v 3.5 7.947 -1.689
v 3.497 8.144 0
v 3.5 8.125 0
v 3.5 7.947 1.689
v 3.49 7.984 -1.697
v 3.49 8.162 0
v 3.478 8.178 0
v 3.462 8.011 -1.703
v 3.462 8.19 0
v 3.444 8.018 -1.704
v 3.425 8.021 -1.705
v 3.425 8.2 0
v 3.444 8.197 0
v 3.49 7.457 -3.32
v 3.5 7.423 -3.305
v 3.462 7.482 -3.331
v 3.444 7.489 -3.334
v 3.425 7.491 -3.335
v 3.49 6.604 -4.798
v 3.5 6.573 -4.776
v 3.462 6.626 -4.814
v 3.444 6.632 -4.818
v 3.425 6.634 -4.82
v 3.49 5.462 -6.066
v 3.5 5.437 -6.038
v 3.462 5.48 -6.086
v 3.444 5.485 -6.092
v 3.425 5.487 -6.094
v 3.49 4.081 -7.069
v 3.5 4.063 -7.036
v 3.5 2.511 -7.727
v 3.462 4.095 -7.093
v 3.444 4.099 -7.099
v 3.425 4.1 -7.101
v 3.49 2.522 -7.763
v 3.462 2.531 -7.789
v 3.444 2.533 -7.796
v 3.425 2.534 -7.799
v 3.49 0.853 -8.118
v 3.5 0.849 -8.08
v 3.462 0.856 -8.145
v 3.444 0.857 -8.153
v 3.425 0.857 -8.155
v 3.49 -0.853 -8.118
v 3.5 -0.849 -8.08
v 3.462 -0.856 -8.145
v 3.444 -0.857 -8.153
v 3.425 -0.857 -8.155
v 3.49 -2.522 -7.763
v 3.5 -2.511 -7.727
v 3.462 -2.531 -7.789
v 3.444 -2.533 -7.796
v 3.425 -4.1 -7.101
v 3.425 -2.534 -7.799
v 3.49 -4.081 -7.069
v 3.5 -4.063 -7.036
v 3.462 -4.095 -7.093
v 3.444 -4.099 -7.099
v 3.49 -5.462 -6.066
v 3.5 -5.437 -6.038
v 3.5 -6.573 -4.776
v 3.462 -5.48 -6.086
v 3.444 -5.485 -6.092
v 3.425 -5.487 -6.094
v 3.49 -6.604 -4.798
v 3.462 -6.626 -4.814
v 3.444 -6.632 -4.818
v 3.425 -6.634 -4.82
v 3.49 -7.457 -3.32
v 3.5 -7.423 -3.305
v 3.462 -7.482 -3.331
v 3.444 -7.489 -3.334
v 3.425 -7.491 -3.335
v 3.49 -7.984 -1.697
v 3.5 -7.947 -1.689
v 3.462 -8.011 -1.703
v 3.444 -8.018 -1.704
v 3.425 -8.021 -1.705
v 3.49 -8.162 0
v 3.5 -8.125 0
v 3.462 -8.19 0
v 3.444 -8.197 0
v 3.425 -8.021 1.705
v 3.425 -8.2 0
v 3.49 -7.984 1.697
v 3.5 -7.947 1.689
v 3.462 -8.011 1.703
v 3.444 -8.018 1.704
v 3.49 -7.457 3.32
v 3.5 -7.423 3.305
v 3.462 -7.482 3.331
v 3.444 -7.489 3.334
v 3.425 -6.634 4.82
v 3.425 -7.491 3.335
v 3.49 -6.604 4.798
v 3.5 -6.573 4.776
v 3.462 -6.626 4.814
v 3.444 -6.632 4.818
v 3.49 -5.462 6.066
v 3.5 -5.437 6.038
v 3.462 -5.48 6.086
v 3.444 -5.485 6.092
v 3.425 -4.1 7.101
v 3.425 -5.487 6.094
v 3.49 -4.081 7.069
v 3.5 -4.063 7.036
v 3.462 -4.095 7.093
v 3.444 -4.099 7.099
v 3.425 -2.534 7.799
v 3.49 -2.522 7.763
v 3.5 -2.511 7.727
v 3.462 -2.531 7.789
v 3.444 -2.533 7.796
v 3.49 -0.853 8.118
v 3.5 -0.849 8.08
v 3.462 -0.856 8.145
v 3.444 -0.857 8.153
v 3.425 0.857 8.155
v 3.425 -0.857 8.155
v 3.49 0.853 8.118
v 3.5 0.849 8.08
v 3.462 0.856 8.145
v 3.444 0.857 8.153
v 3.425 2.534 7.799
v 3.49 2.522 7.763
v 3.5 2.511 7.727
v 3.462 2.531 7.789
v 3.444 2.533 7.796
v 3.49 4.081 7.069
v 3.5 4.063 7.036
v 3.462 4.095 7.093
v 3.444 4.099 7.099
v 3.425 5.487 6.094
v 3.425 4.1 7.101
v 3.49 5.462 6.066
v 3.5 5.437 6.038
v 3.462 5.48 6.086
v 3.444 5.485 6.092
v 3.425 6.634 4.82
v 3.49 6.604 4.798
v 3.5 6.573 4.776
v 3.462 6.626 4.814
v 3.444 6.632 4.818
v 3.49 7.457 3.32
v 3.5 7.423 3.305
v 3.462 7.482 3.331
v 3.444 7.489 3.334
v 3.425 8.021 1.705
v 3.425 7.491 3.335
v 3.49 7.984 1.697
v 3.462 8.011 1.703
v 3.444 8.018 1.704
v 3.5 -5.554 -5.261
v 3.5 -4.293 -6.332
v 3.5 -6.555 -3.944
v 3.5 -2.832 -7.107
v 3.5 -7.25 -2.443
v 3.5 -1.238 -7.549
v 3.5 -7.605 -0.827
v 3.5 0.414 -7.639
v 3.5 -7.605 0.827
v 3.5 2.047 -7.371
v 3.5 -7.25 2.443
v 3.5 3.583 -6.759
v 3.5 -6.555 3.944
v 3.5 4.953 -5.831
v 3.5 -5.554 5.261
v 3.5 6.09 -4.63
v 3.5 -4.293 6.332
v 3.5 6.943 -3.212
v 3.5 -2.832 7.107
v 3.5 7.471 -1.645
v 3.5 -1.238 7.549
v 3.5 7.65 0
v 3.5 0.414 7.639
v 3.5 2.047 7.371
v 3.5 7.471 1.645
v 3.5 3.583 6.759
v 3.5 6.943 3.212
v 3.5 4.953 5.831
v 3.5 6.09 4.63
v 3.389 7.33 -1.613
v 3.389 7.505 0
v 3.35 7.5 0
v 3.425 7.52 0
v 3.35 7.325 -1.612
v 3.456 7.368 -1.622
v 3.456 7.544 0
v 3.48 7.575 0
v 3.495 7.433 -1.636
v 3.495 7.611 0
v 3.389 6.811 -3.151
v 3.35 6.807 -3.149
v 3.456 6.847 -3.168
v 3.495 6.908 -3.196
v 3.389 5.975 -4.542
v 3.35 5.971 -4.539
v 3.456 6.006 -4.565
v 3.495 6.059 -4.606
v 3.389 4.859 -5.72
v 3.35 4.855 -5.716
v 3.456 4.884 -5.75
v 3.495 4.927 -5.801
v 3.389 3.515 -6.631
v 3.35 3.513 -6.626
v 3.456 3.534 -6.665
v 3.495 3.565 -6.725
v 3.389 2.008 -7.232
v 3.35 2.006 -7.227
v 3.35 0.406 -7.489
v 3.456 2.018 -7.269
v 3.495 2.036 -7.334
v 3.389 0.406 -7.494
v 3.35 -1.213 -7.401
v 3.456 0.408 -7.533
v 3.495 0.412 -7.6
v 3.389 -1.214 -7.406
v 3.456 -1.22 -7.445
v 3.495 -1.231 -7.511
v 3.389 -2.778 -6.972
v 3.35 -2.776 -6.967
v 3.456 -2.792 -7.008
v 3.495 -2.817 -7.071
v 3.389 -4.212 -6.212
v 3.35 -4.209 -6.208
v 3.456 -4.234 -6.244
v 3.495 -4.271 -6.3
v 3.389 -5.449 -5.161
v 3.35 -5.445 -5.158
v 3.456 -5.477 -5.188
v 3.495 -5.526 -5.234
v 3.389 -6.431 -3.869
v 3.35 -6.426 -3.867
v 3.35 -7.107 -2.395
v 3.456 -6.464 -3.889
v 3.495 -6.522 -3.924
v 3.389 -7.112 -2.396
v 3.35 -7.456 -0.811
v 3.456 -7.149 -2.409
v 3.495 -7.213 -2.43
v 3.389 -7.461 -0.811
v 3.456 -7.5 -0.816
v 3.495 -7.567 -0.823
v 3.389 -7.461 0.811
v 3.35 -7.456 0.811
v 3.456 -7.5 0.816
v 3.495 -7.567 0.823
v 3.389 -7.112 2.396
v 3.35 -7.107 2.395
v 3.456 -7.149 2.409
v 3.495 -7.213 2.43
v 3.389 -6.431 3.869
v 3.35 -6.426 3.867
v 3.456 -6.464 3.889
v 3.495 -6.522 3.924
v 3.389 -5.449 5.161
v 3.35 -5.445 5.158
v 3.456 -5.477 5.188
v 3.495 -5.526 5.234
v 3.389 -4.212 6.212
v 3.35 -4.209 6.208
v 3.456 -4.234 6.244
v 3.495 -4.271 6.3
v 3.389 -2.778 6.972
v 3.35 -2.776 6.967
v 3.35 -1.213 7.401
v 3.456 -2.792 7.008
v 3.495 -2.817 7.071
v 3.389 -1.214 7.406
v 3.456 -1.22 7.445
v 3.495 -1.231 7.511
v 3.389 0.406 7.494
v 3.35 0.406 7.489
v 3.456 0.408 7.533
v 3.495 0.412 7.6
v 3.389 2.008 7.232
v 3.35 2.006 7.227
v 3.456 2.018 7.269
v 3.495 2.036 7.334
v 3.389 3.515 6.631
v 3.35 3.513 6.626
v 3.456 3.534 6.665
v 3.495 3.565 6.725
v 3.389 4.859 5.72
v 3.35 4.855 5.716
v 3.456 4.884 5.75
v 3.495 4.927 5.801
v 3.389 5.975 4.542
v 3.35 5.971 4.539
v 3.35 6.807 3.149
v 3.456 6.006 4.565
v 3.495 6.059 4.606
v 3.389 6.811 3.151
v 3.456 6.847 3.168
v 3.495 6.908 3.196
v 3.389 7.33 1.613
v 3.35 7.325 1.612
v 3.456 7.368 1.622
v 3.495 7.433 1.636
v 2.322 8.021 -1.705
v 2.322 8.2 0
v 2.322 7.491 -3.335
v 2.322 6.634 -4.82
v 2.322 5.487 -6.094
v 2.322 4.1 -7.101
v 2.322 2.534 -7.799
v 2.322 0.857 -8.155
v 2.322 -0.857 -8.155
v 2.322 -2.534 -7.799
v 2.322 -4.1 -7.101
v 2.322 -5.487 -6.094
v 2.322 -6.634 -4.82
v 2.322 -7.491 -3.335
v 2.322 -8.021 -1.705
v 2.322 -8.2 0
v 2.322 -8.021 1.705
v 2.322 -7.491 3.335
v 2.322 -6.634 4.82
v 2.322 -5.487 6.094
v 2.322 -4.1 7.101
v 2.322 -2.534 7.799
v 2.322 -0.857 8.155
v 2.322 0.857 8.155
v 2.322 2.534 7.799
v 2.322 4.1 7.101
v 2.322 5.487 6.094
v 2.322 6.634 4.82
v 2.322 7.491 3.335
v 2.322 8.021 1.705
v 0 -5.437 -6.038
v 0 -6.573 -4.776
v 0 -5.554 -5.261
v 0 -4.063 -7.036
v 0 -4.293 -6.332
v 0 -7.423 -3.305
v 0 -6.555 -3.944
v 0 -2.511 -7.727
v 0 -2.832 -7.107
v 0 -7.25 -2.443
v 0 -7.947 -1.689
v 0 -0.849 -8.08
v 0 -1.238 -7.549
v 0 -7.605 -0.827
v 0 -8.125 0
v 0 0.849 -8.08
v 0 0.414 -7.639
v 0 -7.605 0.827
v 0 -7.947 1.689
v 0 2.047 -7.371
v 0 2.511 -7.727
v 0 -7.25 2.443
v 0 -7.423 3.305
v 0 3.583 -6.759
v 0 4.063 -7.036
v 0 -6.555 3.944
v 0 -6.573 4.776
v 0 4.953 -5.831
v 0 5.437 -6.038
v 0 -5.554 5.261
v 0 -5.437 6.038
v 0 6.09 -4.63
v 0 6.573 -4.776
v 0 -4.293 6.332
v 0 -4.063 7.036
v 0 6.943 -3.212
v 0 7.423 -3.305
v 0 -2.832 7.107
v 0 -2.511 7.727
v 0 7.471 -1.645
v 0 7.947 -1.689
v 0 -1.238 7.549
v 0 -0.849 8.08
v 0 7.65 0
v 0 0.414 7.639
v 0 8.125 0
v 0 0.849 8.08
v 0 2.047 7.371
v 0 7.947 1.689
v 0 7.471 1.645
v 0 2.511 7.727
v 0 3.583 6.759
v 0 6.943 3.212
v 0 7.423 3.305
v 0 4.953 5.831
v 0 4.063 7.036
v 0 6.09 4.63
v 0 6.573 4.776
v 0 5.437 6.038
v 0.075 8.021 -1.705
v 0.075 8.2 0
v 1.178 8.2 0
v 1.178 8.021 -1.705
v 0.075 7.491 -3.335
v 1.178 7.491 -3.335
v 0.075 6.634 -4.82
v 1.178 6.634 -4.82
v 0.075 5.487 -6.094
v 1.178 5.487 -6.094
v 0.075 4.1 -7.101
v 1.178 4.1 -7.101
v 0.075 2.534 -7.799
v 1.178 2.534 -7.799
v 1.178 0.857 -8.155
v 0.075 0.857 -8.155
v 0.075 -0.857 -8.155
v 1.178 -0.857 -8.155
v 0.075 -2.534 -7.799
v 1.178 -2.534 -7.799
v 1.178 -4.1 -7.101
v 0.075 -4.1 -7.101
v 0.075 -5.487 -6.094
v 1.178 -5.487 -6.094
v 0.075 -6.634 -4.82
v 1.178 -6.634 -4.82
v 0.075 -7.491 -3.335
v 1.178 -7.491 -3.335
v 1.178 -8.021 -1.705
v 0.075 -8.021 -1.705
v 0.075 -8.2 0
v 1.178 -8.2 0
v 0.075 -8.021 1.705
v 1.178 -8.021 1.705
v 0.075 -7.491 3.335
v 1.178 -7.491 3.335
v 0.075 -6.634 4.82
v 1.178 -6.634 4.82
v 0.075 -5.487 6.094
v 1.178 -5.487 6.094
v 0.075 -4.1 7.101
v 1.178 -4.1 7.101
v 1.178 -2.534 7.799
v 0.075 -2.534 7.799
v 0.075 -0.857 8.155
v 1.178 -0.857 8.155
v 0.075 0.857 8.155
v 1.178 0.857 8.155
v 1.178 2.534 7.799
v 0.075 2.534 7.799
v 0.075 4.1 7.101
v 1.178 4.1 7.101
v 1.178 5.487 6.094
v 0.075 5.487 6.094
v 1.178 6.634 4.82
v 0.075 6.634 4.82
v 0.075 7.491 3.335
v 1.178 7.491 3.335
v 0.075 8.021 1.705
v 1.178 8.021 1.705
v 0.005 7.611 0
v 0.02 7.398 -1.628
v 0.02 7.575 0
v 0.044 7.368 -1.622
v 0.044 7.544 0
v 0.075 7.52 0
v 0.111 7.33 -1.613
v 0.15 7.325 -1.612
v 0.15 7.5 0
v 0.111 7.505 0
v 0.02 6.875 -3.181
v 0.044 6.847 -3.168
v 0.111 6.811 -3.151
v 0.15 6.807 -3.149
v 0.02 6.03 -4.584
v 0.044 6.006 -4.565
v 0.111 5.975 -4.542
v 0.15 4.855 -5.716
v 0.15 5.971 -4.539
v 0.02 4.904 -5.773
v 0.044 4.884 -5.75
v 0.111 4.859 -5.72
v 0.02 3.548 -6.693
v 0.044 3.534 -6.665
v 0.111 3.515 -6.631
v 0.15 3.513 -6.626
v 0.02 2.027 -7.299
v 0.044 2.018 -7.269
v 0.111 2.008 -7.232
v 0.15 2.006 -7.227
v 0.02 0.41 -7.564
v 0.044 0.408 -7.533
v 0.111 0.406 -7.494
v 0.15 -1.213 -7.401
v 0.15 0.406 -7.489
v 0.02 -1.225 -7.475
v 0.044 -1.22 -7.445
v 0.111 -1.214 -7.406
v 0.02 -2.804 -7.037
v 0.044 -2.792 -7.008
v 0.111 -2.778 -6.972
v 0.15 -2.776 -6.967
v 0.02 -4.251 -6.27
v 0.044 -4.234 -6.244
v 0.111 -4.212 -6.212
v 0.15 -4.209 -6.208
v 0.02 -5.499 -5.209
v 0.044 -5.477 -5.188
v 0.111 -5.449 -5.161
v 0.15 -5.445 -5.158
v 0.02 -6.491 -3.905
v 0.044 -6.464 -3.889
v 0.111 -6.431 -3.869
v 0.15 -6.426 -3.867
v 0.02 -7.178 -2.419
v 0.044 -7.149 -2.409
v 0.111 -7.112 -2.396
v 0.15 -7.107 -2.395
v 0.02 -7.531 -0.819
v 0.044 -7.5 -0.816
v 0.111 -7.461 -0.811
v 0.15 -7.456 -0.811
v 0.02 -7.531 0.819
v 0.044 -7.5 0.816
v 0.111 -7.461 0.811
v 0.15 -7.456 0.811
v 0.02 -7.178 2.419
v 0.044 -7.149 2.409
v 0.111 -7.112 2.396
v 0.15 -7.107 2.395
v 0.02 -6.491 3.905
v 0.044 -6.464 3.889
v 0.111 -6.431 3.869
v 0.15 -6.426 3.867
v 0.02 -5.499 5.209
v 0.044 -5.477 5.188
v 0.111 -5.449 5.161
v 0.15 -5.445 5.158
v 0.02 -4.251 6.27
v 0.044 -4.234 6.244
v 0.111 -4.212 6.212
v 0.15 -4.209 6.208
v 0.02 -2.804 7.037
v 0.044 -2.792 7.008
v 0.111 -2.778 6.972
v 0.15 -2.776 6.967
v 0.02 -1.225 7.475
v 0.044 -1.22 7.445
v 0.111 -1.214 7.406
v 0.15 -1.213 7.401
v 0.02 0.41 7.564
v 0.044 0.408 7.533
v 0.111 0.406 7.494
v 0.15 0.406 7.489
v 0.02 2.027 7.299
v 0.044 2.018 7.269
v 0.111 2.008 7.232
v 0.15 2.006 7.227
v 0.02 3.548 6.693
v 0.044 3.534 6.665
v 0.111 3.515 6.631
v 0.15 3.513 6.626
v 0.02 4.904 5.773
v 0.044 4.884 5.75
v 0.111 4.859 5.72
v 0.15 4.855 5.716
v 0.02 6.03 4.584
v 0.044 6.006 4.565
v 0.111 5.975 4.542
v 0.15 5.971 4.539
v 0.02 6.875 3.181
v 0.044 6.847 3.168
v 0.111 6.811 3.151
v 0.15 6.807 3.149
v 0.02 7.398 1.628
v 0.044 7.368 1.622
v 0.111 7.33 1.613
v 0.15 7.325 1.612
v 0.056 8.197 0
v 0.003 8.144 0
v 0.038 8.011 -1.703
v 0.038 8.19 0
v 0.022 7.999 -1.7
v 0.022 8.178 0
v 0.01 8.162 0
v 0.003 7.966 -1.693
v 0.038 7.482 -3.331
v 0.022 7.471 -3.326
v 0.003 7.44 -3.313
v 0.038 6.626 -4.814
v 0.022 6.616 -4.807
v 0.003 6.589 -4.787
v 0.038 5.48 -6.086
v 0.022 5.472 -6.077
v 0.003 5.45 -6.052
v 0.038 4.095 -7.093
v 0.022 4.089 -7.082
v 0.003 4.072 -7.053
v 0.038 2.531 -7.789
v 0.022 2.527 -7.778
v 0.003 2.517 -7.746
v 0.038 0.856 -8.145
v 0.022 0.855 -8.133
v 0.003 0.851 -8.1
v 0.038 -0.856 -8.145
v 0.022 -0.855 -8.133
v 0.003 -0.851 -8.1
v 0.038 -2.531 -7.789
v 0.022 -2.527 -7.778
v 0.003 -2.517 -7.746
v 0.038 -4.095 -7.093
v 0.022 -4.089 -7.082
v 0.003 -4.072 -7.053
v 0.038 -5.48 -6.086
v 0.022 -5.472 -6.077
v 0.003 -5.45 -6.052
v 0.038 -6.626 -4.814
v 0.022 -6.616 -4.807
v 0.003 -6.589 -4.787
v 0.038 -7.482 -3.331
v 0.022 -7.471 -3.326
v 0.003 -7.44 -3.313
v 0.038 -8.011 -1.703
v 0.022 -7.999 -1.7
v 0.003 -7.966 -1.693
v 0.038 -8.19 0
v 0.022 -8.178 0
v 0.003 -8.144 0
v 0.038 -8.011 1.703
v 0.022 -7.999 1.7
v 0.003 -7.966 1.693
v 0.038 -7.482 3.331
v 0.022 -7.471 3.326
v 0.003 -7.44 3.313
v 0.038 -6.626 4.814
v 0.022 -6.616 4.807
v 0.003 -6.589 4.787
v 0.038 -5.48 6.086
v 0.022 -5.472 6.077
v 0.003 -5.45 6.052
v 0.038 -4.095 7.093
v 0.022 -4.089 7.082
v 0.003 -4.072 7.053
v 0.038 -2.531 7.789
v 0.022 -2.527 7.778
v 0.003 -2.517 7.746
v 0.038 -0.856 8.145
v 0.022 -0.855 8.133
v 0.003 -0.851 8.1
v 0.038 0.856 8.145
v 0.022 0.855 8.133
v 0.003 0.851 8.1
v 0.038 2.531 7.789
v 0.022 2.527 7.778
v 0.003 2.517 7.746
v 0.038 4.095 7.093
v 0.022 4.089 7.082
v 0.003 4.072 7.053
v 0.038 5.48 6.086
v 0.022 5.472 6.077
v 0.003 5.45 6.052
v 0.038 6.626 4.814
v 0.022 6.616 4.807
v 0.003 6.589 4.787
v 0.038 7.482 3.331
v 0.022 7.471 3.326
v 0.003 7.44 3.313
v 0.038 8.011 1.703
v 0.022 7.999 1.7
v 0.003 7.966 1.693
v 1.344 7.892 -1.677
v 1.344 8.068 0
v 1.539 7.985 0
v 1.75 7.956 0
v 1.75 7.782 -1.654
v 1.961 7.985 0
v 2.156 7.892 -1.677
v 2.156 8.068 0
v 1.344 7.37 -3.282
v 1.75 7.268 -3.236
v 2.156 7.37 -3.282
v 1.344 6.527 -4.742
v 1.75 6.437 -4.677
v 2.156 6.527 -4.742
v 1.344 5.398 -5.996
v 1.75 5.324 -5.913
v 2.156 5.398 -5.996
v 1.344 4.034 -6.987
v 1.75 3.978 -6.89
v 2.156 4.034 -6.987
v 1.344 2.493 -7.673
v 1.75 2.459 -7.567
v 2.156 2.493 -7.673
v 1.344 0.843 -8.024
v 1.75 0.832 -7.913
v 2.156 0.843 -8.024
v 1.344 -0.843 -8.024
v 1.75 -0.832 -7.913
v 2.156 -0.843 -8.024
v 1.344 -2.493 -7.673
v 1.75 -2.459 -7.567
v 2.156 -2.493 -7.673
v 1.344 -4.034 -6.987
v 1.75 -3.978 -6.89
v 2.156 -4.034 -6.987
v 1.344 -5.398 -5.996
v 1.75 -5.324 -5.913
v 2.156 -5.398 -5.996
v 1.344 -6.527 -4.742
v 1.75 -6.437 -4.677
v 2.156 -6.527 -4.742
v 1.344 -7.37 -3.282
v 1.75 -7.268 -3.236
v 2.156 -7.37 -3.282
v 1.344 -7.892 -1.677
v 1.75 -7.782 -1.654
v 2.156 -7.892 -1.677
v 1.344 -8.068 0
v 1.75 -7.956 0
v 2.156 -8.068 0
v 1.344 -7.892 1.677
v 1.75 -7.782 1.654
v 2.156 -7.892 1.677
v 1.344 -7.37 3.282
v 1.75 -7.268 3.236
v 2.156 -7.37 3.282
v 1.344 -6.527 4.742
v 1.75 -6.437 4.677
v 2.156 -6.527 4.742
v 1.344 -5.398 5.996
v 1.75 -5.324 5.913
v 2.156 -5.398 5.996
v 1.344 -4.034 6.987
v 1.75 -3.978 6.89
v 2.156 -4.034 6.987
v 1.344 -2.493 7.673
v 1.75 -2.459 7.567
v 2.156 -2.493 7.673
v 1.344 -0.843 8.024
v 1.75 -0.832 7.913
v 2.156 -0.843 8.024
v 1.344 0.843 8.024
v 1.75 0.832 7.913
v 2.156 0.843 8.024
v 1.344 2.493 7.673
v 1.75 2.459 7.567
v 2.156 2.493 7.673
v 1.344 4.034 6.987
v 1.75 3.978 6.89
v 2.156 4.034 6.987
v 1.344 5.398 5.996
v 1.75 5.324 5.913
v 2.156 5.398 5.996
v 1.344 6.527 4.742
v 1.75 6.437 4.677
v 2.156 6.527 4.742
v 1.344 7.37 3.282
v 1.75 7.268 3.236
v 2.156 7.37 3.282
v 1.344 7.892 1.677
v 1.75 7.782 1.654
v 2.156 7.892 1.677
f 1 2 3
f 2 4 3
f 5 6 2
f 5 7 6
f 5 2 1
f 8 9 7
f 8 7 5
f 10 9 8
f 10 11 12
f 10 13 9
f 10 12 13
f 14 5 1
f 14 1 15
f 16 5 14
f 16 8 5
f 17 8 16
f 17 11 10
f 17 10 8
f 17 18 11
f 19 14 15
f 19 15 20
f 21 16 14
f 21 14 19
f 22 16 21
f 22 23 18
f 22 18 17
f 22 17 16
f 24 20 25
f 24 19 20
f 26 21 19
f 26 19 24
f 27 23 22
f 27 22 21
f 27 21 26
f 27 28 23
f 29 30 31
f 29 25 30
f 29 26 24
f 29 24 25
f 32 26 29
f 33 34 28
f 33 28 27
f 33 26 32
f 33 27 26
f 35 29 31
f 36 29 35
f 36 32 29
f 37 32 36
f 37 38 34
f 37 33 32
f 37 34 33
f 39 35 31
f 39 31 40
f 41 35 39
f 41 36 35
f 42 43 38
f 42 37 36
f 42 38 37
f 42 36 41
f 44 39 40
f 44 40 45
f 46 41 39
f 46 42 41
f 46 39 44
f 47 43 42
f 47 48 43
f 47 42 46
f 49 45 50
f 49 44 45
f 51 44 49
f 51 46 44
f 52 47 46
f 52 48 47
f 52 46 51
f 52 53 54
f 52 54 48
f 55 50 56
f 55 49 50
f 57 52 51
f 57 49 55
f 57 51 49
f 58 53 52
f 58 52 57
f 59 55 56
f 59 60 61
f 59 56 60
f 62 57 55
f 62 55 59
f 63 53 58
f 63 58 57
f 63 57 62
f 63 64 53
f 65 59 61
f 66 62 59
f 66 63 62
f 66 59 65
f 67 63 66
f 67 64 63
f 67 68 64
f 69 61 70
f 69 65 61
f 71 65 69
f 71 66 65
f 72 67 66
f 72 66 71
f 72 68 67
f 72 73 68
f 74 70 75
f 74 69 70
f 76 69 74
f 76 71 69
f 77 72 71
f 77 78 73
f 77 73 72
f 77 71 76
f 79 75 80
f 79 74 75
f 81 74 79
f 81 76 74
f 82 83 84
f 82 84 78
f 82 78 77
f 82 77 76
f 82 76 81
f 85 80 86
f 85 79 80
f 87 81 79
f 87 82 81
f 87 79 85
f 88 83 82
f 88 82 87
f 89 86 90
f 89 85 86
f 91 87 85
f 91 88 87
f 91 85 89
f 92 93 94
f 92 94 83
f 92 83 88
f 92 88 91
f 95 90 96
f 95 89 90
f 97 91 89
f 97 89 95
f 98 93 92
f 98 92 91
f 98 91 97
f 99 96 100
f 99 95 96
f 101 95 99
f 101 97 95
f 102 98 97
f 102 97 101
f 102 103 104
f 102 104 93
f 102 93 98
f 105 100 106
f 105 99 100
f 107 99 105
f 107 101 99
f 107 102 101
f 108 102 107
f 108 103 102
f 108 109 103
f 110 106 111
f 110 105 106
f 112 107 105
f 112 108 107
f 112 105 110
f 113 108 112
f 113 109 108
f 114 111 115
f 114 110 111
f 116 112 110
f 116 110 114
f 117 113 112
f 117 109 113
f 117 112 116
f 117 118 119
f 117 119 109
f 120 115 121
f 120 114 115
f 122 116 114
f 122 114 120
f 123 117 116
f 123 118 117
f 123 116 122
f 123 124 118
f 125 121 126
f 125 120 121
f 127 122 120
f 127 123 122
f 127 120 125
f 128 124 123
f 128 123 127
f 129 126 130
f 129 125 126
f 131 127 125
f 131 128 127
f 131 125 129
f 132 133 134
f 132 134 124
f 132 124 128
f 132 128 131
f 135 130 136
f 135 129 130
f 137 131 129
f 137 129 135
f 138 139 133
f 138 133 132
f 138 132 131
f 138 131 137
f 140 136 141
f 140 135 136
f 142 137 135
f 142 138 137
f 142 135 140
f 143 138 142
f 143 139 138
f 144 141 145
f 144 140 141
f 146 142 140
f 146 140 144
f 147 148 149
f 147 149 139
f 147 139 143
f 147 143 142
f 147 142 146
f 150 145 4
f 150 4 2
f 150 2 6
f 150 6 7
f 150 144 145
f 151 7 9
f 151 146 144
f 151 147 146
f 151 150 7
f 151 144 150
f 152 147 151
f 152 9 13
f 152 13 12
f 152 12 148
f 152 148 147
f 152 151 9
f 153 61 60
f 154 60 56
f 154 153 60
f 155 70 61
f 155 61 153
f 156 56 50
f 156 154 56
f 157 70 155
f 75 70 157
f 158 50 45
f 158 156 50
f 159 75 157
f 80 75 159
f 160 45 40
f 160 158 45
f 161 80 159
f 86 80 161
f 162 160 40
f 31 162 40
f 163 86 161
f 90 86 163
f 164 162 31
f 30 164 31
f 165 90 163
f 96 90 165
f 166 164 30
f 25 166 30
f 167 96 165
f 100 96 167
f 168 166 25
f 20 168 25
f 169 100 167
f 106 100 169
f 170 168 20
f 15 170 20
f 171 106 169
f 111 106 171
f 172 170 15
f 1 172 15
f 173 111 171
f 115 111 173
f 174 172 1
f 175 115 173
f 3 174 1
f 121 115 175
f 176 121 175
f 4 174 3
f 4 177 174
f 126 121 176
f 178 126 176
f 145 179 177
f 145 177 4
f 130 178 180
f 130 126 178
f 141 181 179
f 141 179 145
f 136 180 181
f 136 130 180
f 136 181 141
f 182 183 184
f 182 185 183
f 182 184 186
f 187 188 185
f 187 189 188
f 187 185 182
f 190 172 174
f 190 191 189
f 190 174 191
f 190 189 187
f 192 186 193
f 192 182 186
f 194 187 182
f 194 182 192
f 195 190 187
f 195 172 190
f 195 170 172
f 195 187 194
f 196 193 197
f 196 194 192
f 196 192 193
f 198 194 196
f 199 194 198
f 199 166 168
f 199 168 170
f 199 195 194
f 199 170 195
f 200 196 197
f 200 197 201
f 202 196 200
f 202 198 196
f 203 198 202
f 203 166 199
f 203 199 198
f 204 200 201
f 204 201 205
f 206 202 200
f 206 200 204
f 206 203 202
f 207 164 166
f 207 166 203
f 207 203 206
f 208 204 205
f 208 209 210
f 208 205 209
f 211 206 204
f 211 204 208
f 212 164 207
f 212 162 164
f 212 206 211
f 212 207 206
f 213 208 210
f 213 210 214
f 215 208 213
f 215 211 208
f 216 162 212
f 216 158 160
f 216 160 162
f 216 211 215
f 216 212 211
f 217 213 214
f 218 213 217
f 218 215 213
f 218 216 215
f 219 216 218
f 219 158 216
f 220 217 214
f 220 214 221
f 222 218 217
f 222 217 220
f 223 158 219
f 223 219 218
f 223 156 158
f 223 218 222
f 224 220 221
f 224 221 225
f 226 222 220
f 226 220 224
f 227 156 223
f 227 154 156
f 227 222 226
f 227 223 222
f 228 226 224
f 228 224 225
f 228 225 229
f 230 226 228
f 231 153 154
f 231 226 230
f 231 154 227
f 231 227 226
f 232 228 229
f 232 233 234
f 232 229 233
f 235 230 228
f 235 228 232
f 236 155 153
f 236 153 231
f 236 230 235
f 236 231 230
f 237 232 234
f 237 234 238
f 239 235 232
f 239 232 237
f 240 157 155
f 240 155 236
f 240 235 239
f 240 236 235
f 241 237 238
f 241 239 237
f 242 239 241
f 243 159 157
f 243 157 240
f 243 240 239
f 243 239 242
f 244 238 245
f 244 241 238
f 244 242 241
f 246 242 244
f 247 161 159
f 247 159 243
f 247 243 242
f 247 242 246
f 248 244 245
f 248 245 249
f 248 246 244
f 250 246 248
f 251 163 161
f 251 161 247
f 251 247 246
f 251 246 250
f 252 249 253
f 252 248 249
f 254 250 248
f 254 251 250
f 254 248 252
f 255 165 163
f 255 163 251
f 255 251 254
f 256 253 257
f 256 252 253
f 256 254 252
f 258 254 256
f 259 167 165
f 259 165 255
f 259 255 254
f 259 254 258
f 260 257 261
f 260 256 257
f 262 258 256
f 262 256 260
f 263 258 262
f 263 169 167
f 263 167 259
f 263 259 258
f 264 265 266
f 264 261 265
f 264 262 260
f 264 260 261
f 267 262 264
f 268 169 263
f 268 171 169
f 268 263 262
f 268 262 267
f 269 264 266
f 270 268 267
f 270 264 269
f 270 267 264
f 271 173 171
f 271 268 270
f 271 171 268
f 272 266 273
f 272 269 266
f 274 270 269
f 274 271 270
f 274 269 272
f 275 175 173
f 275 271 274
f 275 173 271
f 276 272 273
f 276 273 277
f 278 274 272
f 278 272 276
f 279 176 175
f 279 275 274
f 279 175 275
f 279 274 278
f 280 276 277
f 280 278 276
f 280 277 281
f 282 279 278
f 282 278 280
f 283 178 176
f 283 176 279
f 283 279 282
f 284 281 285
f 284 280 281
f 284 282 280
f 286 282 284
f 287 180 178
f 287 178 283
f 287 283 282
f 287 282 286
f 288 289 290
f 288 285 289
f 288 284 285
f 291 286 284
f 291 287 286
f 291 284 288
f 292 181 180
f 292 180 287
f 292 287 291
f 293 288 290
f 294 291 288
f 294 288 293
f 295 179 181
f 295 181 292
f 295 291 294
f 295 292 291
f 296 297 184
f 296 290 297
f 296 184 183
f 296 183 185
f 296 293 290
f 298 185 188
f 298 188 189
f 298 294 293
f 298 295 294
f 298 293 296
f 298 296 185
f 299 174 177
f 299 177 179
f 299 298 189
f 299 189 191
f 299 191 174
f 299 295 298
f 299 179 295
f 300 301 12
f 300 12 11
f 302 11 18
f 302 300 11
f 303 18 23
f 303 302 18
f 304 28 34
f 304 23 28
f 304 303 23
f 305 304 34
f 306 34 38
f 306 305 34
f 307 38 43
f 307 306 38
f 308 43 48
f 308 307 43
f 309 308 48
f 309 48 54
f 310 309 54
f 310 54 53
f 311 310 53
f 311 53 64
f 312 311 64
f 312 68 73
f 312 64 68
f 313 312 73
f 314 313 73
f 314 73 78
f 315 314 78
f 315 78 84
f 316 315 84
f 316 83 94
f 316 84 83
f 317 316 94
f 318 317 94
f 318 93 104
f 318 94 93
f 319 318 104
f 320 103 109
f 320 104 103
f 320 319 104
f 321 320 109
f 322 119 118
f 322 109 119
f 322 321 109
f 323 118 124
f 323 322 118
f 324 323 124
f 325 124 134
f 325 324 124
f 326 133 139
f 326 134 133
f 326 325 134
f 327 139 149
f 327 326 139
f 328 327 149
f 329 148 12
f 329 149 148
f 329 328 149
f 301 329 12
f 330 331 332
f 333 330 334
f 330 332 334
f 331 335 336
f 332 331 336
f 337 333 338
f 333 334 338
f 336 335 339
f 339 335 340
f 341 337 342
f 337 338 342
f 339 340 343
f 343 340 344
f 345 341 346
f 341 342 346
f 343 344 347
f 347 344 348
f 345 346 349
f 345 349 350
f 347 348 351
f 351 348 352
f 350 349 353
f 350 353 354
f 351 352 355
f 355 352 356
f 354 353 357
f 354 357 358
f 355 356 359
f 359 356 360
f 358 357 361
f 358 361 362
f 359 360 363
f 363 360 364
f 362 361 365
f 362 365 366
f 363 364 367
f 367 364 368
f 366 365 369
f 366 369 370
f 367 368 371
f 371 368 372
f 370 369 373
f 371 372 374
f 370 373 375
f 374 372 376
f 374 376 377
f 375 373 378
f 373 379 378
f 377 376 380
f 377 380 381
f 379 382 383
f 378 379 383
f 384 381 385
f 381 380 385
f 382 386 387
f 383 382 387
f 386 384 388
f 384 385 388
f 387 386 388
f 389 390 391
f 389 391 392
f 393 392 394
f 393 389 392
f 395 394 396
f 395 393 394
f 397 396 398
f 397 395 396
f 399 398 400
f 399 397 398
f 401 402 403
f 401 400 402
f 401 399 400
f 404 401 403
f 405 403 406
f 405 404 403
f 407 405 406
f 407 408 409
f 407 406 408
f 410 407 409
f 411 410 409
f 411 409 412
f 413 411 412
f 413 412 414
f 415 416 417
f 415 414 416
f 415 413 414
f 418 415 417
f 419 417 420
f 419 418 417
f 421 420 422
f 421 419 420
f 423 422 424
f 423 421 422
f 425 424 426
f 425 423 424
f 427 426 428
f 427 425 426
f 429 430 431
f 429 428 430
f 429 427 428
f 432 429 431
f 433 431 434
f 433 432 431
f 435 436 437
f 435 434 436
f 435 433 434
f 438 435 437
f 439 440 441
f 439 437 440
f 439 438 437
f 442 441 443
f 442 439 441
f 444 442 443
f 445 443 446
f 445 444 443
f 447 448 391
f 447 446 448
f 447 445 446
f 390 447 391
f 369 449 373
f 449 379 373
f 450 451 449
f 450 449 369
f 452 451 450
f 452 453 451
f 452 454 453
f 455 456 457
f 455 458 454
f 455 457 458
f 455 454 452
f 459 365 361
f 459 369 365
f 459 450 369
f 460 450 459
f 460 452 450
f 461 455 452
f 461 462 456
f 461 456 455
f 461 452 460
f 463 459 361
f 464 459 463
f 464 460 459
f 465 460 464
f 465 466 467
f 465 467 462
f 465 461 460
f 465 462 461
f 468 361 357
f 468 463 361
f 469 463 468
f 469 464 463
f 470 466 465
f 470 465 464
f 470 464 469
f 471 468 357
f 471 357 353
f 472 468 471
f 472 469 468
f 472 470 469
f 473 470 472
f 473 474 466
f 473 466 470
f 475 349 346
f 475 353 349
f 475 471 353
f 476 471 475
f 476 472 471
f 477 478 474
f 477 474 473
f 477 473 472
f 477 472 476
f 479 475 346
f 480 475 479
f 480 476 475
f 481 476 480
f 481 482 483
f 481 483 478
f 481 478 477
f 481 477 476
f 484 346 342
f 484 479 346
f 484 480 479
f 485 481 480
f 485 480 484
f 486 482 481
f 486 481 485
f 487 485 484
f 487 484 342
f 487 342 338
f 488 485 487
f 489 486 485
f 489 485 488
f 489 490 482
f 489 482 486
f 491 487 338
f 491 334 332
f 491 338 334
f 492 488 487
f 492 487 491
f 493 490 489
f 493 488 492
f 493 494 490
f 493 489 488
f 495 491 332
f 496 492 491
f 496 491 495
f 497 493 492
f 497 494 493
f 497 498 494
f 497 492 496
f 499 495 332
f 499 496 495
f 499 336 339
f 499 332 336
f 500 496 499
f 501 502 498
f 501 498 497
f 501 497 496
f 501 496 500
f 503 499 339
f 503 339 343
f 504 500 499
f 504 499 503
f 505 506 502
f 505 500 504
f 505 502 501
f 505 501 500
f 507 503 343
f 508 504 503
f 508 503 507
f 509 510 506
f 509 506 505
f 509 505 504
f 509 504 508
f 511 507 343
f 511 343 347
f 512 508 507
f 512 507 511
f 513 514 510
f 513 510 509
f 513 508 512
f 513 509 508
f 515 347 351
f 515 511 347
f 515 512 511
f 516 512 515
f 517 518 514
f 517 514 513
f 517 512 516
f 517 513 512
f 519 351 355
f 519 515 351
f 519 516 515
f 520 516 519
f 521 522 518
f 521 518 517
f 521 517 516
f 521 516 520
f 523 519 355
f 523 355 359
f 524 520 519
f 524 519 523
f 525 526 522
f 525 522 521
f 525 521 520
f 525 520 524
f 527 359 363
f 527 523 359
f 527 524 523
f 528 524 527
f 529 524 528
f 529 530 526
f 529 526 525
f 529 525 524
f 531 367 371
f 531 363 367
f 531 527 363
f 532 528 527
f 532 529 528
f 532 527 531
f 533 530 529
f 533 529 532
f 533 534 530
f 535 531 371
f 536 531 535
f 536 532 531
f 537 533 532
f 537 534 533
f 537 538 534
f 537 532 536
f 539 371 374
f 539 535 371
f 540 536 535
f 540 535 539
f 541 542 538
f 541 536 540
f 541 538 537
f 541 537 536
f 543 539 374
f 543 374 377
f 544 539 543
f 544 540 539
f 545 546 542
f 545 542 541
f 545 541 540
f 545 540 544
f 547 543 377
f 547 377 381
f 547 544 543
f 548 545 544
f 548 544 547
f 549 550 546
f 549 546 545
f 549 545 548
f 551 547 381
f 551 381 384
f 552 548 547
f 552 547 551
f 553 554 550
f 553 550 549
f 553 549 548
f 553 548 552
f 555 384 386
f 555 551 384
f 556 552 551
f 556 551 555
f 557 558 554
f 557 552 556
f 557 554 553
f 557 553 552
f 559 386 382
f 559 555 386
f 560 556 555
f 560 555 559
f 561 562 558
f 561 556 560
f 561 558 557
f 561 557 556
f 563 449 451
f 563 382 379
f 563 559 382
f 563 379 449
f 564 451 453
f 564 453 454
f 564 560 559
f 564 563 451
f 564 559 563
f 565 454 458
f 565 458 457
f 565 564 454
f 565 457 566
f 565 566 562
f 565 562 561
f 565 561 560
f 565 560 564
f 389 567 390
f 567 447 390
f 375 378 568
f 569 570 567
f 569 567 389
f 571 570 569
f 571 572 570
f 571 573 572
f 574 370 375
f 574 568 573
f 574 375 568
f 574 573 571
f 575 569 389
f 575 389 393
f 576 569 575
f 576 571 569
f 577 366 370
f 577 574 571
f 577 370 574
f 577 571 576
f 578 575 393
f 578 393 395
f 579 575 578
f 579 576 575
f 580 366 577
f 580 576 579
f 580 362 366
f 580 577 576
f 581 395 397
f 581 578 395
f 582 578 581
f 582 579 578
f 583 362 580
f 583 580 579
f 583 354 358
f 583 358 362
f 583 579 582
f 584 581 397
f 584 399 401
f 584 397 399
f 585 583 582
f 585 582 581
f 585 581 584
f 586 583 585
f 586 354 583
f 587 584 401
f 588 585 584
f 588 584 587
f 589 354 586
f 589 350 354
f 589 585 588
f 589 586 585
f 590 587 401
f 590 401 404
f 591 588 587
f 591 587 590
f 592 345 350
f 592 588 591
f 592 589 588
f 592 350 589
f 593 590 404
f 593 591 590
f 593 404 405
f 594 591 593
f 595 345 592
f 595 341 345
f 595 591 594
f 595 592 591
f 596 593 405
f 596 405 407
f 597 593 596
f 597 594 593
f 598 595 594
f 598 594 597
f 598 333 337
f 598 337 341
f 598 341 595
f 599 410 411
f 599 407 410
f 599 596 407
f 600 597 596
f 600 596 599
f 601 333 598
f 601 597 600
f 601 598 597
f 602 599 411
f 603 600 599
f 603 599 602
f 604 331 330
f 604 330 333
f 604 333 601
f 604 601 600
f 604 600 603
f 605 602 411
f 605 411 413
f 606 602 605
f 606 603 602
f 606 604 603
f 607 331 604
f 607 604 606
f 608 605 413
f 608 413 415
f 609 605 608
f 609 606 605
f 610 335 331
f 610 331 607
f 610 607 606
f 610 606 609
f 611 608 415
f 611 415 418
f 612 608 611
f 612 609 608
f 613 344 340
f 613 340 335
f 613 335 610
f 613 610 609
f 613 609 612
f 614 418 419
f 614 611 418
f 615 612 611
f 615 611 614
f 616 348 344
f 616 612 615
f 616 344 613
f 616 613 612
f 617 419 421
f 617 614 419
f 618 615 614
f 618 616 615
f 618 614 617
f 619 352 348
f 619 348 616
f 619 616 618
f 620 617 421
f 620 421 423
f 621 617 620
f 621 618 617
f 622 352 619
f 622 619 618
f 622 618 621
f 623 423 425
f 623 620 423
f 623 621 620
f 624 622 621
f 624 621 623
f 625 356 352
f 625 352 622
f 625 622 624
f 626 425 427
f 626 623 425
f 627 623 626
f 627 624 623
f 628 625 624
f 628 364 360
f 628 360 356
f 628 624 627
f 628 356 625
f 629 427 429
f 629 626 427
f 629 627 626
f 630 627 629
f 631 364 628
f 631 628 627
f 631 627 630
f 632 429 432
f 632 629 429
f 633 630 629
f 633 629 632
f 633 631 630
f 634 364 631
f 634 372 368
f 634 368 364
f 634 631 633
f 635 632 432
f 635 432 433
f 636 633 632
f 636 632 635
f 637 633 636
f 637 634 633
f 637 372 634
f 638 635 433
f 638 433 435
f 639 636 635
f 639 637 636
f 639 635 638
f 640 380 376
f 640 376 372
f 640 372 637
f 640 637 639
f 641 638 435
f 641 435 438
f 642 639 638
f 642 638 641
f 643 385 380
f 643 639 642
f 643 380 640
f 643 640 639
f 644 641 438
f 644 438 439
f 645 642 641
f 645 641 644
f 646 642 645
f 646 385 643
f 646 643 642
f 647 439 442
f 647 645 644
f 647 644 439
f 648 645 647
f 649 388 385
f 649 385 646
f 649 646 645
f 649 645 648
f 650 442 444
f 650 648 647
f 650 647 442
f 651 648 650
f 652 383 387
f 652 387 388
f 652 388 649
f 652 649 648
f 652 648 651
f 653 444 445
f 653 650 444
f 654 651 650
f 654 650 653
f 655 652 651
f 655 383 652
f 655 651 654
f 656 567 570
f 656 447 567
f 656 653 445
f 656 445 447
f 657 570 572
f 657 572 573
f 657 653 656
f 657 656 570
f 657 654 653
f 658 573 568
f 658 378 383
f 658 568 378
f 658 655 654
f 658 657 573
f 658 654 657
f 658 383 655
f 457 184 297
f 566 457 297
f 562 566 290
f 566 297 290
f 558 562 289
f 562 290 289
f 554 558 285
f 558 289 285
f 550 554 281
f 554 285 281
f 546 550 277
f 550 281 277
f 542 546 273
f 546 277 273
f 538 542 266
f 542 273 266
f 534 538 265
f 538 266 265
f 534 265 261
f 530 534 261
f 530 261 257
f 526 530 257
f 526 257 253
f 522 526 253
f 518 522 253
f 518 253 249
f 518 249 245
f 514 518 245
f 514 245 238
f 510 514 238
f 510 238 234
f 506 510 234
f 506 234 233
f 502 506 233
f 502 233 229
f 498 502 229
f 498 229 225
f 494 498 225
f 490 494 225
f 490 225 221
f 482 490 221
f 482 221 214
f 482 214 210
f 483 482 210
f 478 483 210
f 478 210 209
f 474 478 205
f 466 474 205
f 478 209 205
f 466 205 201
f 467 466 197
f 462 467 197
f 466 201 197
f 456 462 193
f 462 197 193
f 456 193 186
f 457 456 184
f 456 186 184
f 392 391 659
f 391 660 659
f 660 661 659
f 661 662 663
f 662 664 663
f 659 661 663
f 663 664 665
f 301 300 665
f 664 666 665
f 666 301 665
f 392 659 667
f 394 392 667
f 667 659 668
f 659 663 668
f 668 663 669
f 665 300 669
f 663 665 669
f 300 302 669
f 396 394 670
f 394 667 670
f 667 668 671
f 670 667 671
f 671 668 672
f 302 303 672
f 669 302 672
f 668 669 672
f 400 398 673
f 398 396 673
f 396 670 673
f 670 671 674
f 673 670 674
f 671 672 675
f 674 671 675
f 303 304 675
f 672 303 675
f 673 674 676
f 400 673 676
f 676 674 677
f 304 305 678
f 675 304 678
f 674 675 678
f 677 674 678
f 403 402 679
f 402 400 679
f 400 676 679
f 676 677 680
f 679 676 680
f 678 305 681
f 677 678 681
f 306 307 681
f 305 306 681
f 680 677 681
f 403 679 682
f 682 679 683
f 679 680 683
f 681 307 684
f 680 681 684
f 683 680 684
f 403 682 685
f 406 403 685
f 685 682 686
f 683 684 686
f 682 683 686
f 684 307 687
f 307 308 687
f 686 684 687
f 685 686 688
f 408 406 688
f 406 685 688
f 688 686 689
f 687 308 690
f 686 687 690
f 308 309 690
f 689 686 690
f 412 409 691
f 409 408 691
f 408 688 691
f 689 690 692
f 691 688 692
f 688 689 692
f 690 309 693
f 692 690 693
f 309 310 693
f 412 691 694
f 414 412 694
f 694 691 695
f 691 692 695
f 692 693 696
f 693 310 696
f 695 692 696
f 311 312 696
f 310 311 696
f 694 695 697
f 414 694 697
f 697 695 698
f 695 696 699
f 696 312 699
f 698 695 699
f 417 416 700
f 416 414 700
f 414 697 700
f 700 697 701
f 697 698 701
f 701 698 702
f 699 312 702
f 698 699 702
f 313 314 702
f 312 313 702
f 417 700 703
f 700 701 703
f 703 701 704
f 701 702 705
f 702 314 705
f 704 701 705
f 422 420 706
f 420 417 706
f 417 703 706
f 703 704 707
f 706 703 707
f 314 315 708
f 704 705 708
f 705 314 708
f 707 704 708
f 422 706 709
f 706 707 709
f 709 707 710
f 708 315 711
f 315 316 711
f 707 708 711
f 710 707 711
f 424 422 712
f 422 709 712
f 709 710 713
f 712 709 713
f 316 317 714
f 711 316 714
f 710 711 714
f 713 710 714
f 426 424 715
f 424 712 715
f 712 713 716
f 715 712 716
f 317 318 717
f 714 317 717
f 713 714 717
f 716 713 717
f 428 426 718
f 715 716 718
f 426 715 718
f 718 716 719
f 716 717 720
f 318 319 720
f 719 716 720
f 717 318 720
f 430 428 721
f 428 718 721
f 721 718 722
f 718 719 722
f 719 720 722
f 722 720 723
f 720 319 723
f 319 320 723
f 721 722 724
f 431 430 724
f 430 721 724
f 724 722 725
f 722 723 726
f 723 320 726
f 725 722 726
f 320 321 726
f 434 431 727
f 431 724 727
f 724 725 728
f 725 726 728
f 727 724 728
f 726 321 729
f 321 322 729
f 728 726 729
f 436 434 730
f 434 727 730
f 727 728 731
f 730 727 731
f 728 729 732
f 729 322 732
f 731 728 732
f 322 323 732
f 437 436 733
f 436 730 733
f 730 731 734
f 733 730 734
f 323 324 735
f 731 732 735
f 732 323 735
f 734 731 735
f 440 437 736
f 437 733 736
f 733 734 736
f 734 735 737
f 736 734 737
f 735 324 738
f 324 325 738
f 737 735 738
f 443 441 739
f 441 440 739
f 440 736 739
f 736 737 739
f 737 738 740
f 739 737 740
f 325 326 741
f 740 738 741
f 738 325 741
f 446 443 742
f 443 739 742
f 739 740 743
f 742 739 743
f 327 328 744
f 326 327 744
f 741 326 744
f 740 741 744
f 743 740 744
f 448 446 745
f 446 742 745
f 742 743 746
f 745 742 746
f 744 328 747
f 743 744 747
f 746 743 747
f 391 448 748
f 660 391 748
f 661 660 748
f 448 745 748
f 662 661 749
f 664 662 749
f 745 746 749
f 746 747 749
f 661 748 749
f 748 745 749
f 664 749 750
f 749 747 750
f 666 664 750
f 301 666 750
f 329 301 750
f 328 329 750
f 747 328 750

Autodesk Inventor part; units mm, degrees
sketch "Sketch_1" plane through (0, 0, 0) normal (0, 0, 1) x (1, 0, 0)
  line L0 (3.5, 0) -> (0, 0)
  line L1 (0, 8.125) -> (0, 7.65)
  arc A0 (0, 7.65) -> (0.15, 7.5) centre (0.15, 7.65) ccw
  line L2 (0.15, 7.5) -> (3.35, 7.5)
  arc A1 (3.35, 7.5) -> (3.5, 7.65) centre (3.35, 7.65) ccw
  line L3 (3.5, 7.65) -> (3.5, 8.125)
  arc A2 (3.5, 8.125) -> (3.425, 8.2) centre (3.425, 8.125) ccw
  line L4 (3.425, 8.2) -> (2.3223, 8.2)
  arc A3 (1.1777, 8.2) -> (2.3223, 8.2) centre (1.75, 8.75) ccw
  line L5 (1.1777, 8.2) -> (0.075, 8.2)
  arc A4 (0.075, 8.2) -> (0, 8.125) centre (0.075, 8.125) ccw
revolve "Revolution1" add sketch "Sketch_1" angle 360 about axis through (3.5, 0, 0) along (1, 0, 0)
ref_plane "1_XY" through (1.75, 0, 0) normal (1, 0, 0) x (0, 0, -1)
ref_plane "1_YZ" through (1.75, 0, 0) normal (0, 0, -1) x (0, 1, 0)
ref_plane "1_ZX" through (1.75, 0, 0) normal (0, 1, 0) x (1, 0, 0)
ref_plane "1_Dummy_XY" through (0, 0, 0) normal (-1, 0, 0) x (0, 0, -1)
ref_plane "1_Dummy_YZ" through (0, 0, 0) normal (0, 0, -1) x (0, -1, 0)
ref_plane "1_Dummy_ZX" through (0, 0, 0) normal (0, -1, 0) x (-1, 0, 0)
properties part number "A-2015_ir"
